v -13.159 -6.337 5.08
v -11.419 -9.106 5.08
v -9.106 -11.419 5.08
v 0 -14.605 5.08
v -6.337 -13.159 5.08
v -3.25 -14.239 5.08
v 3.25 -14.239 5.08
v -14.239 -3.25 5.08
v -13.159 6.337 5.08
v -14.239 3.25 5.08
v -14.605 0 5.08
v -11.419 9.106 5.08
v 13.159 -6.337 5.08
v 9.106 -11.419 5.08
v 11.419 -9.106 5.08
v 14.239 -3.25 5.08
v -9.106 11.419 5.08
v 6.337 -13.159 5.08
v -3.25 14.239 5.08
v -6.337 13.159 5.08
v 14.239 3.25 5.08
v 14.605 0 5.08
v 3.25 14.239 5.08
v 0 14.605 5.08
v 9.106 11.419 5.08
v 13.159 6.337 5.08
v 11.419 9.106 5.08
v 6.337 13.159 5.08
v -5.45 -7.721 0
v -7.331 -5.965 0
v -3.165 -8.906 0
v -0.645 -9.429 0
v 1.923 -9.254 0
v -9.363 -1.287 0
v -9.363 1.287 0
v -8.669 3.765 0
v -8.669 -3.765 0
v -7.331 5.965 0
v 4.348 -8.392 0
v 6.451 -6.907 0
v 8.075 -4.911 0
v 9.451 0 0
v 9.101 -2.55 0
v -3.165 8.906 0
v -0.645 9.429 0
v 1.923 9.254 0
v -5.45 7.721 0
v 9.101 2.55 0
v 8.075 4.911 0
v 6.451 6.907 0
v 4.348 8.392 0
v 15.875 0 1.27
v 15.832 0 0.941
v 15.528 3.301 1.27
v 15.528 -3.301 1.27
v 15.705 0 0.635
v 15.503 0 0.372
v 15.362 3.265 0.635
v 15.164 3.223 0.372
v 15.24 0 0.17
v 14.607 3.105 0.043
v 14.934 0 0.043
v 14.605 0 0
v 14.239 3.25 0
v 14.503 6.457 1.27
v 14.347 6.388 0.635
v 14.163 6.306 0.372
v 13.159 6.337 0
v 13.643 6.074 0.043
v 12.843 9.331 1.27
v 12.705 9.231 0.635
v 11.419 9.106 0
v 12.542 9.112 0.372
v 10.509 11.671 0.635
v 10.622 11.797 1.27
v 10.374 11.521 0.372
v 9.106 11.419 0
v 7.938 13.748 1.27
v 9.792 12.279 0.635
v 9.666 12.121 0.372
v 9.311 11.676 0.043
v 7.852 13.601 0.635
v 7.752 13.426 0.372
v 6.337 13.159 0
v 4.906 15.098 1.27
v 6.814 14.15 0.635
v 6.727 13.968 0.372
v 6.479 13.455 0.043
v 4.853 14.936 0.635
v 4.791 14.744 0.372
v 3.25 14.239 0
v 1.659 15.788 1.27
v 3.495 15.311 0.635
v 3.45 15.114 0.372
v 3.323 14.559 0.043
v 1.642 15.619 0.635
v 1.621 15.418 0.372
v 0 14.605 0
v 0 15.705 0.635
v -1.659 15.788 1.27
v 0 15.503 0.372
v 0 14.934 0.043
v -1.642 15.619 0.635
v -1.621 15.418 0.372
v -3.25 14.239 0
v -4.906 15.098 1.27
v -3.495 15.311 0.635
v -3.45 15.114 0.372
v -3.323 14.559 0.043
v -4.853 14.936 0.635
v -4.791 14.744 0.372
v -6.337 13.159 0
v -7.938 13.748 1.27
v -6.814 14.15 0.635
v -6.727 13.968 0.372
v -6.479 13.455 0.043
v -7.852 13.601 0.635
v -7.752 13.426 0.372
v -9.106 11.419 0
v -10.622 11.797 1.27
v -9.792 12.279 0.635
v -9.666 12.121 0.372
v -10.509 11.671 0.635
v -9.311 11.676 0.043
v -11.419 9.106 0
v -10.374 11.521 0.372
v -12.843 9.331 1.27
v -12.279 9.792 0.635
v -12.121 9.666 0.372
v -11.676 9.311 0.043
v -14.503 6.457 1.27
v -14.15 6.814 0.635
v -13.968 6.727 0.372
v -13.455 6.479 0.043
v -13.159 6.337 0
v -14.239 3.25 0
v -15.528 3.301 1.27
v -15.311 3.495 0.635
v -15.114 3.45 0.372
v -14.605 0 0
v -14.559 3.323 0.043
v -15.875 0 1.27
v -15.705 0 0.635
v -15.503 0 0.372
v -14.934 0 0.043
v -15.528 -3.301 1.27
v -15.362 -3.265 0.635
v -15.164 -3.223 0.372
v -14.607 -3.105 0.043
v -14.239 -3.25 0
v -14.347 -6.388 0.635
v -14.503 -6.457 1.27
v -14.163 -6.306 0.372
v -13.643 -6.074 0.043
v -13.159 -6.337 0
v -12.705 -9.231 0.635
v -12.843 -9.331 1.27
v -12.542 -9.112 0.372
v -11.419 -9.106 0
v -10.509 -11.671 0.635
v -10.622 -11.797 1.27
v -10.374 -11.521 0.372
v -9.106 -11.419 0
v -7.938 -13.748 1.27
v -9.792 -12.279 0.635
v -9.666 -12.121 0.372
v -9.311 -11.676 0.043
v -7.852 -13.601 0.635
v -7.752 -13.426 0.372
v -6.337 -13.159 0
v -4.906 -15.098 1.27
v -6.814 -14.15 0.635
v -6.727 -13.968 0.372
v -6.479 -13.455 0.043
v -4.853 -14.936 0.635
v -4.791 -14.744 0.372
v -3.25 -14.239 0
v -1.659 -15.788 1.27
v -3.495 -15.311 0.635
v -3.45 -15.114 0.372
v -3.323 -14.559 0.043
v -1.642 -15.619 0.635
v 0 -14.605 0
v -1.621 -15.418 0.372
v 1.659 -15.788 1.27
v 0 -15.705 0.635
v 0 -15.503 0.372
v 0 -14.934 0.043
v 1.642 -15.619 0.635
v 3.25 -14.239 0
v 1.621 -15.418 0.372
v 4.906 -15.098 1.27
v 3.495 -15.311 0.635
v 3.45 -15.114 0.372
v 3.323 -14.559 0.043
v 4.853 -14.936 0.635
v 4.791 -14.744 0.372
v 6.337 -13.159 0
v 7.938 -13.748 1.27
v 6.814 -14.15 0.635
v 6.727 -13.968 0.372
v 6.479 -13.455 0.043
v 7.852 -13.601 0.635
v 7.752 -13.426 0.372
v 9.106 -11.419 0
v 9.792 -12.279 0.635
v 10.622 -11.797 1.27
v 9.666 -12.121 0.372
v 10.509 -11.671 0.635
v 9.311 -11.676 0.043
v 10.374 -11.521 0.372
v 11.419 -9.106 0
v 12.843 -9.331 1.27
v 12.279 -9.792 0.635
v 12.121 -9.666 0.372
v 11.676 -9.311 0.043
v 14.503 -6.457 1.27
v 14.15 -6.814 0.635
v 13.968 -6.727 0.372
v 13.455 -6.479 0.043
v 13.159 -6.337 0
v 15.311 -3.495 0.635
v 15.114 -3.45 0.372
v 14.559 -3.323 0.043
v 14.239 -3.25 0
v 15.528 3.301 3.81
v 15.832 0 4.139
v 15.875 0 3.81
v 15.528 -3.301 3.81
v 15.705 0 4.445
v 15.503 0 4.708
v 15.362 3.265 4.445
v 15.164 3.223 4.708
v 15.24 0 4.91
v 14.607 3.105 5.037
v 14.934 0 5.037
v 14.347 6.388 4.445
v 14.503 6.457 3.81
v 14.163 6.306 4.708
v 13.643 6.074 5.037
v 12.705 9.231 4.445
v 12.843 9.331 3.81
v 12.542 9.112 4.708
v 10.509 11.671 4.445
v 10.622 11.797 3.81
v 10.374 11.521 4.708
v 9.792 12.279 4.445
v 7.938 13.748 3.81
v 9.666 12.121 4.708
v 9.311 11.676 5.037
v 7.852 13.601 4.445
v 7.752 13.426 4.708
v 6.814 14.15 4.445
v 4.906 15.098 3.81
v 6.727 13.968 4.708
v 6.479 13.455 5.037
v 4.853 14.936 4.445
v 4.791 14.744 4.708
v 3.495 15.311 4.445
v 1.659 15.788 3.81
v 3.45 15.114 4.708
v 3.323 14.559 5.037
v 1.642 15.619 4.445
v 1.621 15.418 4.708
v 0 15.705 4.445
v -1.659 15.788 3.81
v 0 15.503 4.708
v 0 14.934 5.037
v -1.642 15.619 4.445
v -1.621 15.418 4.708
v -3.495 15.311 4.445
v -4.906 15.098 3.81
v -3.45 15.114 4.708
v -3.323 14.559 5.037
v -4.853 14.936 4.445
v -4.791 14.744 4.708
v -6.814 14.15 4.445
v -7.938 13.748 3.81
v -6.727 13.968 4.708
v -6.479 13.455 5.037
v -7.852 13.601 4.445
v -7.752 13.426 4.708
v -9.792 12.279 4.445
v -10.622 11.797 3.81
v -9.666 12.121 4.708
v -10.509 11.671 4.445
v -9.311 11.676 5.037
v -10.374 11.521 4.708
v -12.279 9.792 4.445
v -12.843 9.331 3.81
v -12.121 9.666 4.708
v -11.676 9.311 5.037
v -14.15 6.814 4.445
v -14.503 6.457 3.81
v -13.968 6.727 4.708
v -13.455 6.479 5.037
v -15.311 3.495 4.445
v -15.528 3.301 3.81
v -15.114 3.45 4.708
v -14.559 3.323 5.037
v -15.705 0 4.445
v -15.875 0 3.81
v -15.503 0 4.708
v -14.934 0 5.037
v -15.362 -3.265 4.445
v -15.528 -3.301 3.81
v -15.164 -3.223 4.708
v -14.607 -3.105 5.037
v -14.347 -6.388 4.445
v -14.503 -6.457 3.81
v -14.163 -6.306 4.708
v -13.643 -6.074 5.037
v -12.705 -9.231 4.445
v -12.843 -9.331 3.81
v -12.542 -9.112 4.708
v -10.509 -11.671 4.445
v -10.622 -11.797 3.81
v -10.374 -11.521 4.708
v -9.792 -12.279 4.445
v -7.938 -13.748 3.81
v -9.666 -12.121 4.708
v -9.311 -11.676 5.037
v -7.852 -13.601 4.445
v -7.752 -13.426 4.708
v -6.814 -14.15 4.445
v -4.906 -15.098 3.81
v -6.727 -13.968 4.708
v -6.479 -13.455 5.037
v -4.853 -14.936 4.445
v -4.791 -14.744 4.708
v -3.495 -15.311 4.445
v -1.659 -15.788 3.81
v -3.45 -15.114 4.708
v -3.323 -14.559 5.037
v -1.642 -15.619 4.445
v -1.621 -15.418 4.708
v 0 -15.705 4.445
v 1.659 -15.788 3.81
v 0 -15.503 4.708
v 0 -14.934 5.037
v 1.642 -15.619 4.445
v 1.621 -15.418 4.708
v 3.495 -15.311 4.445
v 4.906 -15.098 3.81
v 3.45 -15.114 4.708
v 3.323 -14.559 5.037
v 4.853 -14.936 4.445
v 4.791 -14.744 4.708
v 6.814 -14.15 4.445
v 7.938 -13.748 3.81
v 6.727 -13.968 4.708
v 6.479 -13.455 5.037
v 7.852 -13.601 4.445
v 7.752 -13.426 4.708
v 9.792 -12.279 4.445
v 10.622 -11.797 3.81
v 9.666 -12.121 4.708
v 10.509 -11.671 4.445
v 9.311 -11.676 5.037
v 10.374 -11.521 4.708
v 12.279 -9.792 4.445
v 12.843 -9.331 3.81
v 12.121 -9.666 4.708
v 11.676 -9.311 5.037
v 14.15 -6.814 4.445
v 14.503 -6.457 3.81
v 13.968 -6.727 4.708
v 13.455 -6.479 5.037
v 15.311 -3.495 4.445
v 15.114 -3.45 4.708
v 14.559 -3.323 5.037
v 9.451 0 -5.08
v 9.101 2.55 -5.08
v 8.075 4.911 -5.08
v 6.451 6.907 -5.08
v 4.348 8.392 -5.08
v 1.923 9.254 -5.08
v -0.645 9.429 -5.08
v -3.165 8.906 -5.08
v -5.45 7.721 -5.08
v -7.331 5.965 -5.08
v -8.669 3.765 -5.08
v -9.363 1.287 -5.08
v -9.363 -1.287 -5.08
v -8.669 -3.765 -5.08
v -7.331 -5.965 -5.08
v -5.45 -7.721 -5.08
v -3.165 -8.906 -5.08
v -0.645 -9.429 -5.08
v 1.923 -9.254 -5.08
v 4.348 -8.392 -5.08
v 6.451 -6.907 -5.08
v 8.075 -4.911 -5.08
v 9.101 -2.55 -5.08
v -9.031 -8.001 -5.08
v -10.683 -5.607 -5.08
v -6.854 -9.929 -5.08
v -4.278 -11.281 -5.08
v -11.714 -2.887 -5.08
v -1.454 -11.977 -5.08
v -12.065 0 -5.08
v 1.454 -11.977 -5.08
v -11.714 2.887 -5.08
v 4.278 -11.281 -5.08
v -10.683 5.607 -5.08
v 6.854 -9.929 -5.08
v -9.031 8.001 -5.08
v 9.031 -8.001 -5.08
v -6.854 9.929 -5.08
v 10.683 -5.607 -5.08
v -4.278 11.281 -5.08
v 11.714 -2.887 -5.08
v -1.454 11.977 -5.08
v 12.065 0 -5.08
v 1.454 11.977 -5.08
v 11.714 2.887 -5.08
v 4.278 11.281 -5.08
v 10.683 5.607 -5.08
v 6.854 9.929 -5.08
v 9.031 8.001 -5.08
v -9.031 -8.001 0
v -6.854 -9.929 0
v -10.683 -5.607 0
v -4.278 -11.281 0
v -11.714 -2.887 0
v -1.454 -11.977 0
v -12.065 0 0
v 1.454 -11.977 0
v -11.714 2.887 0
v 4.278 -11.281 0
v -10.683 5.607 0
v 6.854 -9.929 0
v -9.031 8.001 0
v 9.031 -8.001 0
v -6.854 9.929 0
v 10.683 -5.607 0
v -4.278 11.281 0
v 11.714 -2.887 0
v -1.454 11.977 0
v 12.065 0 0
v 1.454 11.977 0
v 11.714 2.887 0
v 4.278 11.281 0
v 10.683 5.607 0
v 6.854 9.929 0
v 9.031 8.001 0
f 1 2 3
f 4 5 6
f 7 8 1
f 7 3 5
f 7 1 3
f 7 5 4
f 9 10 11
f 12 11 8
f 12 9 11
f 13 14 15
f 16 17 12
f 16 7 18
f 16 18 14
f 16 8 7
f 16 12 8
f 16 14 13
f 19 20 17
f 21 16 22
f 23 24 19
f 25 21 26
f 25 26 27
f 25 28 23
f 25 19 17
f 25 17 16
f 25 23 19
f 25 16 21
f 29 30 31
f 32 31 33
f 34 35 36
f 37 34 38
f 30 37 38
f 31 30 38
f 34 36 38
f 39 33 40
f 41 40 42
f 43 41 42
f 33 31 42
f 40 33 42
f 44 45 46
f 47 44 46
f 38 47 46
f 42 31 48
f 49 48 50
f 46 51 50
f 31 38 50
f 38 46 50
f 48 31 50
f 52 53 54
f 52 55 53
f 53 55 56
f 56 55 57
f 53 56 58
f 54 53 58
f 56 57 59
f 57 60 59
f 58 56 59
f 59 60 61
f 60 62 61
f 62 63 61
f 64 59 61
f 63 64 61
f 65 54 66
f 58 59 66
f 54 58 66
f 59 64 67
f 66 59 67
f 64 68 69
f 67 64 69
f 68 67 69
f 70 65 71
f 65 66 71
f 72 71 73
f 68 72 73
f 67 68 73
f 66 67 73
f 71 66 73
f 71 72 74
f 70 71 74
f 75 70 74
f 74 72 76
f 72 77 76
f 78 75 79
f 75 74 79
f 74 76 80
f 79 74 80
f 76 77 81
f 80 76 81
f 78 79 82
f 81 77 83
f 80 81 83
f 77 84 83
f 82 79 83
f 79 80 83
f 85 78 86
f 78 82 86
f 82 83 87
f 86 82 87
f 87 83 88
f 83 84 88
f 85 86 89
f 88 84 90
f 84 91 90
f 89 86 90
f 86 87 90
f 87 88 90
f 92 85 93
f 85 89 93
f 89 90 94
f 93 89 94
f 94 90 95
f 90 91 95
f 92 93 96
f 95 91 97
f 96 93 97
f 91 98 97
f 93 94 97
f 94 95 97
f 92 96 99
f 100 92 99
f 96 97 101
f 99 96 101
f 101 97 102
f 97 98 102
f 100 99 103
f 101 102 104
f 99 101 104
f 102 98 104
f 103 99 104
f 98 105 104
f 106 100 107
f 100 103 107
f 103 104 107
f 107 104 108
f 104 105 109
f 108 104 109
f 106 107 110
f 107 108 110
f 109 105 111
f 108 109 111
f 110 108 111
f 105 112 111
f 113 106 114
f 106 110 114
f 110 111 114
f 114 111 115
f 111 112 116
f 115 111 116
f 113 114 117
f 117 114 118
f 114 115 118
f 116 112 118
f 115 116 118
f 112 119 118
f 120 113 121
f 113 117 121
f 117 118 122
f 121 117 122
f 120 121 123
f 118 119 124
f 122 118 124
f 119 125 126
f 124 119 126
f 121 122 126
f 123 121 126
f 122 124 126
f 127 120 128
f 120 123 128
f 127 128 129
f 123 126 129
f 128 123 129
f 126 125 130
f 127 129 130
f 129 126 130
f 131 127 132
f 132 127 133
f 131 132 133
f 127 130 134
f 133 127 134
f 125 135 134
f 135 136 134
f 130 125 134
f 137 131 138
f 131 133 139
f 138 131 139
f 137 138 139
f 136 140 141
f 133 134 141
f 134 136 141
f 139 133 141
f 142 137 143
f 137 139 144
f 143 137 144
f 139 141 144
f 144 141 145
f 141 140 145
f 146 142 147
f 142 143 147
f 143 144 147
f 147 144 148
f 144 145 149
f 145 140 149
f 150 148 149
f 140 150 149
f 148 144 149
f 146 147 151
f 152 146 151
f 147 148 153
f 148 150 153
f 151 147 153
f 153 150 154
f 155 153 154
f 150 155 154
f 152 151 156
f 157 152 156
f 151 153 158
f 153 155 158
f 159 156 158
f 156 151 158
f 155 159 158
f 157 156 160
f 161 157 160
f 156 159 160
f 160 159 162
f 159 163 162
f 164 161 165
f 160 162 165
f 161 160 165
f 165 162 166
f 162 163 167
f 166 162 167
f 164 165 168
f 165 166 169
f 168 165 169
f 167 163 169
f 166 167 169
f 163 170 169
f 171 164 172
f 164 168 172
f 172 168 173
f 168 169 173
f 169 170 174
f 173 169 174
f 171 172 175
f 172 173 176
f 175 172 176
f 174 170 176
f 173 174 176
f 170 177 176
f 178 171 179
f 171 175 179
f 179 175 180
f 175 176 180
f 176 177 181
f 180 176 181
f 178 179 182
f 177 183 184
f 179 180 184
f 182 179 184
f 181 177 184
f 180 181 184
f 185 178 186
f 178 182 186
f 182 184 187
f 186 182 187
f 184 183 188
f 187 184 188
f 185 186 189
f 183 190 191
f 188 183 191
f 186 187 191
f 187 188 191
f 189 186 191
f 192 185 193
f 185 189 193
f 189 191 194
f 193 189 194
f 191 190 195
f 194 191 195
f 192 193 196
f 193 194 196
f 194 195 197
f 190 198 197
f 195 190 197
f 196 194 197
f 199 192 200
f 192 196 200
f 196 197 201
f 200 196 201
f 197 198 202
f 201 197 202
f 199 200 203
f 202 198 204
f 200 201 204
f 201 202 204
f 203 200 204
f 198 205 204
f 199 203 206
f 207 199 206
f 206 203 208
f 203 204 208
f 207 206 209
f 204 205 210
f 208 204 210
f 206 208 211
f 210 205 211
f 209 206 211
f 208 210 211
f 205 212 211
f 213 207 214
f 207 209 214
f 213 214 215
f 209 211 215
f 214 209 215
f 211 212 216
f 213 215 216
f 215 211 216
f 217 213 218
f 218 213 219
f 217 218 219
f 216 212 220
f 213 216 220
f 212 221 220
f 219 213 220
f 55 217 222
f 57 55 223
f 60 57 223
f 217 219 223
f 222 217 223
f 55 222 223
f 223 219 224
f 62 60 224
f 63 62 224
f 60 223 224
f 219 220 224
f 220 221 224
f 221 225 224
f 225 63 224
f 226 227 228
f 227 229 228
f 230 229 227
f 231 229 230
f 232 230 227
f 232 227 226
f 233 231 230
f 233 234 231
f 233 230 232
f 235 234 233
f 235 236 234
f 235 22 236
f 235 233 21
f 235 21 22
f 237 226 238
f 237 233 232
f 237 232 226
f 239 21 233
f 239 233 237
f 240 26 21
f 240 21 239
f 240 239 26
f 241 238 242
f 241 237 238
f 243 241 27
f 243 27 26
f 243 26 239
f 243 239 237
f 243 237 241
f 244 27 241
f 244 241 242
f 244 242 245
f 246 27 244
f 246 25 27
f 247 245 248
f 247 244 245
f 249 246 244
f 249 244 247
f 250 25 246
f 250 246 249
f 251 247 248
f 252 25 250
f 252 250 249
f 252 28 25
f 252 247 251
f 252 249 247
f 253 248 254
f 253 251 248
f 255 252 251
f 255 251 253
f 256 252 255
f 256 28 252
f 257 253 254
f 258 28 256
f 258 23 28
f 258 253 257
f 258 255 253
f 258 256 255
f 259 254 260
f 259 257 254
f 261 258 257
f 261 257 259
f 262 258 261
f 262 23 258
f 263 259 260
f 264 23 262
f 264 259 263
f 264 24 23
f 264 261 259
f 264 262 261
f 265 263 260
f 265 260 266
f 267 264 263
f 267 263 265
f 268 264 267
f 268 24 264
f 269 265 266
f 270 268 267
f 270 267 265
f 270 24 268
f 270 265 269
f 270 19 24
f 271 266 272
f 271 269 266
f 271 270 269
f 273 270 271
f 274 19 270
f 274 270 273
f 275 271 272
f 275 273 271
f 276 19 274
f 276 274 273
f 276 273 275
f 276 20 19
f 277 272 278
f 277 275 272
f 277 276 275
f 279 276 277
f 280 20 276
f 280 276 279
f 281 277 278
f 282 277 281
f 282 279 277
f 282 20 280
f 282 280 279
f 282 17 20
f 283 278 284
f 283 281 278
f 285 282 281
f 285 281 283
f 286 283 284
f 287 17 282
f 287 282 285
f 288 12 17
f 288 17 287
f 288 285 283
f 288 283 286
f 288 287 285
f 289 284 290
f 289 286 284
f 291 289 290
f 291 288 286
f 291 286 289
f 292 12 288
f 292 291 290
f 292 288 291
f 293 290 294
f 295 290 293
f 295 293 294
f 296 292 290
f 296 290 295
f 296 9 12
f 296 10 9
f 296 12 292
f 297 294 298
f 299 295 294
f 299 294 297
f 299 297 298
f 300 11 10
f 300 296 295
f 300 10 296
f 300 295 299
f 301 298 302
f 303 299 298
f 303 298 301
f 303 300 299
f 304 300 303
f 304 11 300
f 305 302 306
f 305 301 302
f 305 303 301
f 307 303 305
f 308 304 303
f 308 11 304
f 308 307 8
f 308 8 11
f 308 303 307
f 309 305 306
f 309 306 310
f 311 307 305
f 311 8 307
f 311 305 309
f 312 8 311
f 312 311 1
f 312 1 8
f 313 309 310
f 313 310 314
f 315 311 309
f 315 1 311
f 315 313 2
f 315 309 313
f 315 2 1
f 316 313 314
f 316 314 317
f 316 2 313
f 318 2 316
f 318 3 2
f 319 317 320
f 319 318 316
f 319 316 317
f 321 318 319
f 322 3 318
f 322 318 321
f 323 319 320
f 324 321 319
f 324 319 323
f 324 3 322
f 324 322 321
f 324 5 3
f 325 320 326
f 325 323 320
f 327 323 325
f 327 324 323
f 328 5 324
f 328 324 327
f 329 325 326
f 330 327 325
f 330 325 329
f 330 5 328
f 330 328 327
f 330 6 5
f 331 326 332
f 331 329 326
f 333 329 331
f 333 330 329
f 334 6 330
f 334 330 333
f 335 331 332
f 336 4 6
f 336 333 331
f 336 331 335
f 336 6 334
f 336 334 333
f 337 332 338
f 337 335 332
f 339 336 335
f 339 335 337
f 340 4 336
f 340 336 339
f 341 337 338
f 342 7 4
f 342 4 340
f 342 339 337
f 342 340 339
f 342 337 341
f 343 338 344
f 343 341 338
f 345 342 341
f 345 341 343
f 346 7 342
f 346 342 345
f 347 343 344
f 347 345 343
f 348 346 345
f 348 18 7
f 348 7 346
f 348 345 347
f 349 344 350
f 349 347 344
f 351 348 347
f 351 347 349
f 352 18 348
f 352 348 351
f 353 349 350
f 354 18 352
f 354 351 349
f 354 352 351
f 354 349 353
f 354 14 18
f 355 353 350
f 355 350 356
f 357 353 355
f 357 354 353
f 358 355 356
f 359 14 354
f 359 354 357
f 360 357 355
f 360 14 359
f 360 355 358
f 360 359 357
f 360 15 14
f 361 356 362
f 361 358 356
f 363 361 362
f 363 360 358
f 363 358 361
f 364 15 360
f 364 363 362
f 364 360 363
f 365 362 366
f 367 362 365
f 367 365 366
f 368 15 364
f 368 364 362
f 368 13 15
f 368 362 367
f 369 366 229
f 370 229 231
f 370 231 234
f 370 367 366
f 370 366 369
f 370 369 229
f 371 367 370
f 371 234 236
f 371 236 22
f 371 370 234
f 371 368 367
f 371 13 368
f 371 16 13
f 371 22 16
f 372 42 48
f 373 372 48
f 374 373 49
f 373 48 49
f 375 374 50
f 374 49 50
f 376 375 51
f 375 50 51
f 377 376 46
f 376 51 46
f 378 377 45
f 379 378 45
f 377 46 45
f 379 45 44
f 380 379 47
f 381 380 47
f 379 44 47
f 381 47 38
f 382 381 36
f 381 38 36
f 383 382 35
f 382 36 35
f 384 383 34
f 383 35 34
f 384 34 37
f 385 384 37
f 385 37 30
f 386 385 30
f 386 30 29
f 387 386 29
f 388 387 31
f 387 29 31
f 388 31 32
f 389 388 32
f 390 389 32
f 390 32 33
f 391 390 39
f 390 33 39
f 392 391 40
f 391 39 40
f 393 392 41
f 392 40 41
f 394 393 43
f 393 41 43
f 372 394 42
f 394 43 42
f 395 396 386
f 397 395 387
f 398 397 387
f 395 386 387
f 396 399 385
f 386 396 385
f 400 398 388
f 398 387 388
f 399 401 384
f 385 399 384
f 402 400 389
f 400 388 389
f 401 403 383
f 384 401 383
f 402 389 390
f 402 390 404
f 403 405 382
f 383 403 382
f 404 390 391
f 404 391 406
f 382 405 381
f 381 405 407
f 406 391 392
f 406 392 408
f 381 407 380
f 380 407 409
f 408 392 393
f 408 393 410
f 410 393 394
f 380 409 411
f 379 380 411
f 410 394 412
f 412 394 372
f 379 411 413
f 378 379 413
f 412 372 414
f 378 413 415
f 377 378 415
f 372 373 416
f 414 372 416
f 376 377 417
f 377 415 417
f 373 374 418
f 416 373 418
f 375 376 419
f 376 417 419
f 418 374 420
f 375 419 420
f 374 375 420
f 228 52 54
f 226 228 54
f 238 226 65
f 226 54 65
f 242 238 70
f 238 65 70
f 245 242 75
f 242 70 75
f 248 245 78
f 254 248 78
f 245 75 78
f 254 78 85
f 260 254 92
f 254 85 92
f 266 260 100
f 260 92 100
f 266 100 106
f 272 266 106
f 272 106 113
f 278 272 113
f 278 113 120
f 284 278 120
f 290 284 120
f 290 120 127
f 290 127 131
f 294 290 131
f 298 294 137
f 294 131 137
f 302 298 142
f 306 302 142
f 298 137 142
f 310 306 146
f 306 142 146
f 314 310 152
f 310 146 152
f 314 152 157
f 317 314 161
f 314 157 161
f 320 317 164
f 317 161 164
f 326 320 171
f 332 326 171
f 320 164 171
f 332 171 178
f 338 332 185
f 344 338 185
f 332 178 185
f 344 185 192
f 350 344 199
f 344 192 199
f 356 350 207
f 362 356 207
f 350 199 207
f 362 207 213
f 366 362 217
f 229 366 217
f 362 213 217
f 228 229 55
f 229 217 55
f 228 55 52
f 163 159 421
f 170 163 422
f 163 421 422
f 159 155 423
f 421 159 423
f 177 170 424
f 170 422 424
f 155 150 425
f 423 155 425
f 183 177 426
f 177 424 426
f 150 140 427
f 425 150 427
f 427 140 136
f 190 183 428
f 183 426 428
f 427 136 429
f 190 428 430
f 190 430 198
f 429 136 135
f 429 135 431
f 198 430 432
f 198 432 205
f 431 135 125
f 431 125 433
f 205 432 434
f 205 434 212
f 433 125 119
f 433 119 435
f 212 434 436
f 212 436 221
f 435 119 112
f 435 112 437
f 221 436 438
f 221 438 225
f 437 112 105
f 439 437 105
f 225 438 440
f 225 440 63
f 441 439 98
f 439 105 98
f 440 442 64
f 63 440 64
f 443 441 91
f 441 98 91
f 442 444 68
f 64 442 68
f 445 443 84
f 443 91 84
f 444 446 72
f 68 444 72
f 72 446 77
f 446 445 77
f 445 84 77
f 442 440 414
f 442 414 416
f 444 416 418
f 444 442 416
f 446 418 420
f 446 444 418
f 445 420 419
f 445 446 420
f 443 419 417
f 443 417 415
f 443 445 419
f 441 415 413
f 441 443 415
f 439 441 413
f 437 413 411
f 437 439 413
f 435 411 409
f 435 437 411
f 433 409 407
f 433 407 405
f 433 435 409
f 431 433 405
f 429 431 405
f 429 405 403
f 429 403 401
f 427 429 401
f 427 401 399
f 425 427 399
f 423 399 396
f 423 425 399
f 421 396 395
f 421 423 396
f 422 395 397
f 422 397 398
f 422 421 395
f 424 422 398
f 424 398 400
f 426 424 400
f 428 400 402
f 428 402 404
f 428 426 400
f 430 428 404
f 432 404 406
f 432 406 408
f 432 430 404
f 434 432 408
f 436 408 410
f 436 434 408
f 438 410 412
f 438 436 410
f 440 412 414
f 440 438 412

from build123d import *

# Parameters (mm, degrees)
F0_R     = 15.875
F0_R_2   = 12.065
F0_R_3   = 9.45129
F1_DEPTH = 5.08
F2_DEPTH = 5.08
F3_R     = 1.27


with BuildPart() as f1:
    # F0 (on Top) → F1 (new body)
    with BuildSketch(Plane.XY):
        Circle(F0_R)
        Circle(F0_R_2, mode=Mode.SUBTRACT)
        Circle(F0_R_2)
        Circle(F0_R_3, mode=Mode.SUBTRACT)
        Circle(F0_R_3)
    extrude(amount=F1_DEPTH)

    # F0 (on Top) → F2 (join)
    with BuildSketch(Plane.XY):
        Circle(F0_R_2)
        Circle(F0_R_3, mode=Mode.SUBTRACT)
    extrude(amount=-F2_DEPTH)

    # F3
    f3_edges = [f1.edges().sort_by_distance(p)[0] for p in [
        (-15.875, 0, 5.08),
        (-15.875, 0, 0),
    ]]
    fillet(f3_edges, radius=F3_R)


solid = f1.part
